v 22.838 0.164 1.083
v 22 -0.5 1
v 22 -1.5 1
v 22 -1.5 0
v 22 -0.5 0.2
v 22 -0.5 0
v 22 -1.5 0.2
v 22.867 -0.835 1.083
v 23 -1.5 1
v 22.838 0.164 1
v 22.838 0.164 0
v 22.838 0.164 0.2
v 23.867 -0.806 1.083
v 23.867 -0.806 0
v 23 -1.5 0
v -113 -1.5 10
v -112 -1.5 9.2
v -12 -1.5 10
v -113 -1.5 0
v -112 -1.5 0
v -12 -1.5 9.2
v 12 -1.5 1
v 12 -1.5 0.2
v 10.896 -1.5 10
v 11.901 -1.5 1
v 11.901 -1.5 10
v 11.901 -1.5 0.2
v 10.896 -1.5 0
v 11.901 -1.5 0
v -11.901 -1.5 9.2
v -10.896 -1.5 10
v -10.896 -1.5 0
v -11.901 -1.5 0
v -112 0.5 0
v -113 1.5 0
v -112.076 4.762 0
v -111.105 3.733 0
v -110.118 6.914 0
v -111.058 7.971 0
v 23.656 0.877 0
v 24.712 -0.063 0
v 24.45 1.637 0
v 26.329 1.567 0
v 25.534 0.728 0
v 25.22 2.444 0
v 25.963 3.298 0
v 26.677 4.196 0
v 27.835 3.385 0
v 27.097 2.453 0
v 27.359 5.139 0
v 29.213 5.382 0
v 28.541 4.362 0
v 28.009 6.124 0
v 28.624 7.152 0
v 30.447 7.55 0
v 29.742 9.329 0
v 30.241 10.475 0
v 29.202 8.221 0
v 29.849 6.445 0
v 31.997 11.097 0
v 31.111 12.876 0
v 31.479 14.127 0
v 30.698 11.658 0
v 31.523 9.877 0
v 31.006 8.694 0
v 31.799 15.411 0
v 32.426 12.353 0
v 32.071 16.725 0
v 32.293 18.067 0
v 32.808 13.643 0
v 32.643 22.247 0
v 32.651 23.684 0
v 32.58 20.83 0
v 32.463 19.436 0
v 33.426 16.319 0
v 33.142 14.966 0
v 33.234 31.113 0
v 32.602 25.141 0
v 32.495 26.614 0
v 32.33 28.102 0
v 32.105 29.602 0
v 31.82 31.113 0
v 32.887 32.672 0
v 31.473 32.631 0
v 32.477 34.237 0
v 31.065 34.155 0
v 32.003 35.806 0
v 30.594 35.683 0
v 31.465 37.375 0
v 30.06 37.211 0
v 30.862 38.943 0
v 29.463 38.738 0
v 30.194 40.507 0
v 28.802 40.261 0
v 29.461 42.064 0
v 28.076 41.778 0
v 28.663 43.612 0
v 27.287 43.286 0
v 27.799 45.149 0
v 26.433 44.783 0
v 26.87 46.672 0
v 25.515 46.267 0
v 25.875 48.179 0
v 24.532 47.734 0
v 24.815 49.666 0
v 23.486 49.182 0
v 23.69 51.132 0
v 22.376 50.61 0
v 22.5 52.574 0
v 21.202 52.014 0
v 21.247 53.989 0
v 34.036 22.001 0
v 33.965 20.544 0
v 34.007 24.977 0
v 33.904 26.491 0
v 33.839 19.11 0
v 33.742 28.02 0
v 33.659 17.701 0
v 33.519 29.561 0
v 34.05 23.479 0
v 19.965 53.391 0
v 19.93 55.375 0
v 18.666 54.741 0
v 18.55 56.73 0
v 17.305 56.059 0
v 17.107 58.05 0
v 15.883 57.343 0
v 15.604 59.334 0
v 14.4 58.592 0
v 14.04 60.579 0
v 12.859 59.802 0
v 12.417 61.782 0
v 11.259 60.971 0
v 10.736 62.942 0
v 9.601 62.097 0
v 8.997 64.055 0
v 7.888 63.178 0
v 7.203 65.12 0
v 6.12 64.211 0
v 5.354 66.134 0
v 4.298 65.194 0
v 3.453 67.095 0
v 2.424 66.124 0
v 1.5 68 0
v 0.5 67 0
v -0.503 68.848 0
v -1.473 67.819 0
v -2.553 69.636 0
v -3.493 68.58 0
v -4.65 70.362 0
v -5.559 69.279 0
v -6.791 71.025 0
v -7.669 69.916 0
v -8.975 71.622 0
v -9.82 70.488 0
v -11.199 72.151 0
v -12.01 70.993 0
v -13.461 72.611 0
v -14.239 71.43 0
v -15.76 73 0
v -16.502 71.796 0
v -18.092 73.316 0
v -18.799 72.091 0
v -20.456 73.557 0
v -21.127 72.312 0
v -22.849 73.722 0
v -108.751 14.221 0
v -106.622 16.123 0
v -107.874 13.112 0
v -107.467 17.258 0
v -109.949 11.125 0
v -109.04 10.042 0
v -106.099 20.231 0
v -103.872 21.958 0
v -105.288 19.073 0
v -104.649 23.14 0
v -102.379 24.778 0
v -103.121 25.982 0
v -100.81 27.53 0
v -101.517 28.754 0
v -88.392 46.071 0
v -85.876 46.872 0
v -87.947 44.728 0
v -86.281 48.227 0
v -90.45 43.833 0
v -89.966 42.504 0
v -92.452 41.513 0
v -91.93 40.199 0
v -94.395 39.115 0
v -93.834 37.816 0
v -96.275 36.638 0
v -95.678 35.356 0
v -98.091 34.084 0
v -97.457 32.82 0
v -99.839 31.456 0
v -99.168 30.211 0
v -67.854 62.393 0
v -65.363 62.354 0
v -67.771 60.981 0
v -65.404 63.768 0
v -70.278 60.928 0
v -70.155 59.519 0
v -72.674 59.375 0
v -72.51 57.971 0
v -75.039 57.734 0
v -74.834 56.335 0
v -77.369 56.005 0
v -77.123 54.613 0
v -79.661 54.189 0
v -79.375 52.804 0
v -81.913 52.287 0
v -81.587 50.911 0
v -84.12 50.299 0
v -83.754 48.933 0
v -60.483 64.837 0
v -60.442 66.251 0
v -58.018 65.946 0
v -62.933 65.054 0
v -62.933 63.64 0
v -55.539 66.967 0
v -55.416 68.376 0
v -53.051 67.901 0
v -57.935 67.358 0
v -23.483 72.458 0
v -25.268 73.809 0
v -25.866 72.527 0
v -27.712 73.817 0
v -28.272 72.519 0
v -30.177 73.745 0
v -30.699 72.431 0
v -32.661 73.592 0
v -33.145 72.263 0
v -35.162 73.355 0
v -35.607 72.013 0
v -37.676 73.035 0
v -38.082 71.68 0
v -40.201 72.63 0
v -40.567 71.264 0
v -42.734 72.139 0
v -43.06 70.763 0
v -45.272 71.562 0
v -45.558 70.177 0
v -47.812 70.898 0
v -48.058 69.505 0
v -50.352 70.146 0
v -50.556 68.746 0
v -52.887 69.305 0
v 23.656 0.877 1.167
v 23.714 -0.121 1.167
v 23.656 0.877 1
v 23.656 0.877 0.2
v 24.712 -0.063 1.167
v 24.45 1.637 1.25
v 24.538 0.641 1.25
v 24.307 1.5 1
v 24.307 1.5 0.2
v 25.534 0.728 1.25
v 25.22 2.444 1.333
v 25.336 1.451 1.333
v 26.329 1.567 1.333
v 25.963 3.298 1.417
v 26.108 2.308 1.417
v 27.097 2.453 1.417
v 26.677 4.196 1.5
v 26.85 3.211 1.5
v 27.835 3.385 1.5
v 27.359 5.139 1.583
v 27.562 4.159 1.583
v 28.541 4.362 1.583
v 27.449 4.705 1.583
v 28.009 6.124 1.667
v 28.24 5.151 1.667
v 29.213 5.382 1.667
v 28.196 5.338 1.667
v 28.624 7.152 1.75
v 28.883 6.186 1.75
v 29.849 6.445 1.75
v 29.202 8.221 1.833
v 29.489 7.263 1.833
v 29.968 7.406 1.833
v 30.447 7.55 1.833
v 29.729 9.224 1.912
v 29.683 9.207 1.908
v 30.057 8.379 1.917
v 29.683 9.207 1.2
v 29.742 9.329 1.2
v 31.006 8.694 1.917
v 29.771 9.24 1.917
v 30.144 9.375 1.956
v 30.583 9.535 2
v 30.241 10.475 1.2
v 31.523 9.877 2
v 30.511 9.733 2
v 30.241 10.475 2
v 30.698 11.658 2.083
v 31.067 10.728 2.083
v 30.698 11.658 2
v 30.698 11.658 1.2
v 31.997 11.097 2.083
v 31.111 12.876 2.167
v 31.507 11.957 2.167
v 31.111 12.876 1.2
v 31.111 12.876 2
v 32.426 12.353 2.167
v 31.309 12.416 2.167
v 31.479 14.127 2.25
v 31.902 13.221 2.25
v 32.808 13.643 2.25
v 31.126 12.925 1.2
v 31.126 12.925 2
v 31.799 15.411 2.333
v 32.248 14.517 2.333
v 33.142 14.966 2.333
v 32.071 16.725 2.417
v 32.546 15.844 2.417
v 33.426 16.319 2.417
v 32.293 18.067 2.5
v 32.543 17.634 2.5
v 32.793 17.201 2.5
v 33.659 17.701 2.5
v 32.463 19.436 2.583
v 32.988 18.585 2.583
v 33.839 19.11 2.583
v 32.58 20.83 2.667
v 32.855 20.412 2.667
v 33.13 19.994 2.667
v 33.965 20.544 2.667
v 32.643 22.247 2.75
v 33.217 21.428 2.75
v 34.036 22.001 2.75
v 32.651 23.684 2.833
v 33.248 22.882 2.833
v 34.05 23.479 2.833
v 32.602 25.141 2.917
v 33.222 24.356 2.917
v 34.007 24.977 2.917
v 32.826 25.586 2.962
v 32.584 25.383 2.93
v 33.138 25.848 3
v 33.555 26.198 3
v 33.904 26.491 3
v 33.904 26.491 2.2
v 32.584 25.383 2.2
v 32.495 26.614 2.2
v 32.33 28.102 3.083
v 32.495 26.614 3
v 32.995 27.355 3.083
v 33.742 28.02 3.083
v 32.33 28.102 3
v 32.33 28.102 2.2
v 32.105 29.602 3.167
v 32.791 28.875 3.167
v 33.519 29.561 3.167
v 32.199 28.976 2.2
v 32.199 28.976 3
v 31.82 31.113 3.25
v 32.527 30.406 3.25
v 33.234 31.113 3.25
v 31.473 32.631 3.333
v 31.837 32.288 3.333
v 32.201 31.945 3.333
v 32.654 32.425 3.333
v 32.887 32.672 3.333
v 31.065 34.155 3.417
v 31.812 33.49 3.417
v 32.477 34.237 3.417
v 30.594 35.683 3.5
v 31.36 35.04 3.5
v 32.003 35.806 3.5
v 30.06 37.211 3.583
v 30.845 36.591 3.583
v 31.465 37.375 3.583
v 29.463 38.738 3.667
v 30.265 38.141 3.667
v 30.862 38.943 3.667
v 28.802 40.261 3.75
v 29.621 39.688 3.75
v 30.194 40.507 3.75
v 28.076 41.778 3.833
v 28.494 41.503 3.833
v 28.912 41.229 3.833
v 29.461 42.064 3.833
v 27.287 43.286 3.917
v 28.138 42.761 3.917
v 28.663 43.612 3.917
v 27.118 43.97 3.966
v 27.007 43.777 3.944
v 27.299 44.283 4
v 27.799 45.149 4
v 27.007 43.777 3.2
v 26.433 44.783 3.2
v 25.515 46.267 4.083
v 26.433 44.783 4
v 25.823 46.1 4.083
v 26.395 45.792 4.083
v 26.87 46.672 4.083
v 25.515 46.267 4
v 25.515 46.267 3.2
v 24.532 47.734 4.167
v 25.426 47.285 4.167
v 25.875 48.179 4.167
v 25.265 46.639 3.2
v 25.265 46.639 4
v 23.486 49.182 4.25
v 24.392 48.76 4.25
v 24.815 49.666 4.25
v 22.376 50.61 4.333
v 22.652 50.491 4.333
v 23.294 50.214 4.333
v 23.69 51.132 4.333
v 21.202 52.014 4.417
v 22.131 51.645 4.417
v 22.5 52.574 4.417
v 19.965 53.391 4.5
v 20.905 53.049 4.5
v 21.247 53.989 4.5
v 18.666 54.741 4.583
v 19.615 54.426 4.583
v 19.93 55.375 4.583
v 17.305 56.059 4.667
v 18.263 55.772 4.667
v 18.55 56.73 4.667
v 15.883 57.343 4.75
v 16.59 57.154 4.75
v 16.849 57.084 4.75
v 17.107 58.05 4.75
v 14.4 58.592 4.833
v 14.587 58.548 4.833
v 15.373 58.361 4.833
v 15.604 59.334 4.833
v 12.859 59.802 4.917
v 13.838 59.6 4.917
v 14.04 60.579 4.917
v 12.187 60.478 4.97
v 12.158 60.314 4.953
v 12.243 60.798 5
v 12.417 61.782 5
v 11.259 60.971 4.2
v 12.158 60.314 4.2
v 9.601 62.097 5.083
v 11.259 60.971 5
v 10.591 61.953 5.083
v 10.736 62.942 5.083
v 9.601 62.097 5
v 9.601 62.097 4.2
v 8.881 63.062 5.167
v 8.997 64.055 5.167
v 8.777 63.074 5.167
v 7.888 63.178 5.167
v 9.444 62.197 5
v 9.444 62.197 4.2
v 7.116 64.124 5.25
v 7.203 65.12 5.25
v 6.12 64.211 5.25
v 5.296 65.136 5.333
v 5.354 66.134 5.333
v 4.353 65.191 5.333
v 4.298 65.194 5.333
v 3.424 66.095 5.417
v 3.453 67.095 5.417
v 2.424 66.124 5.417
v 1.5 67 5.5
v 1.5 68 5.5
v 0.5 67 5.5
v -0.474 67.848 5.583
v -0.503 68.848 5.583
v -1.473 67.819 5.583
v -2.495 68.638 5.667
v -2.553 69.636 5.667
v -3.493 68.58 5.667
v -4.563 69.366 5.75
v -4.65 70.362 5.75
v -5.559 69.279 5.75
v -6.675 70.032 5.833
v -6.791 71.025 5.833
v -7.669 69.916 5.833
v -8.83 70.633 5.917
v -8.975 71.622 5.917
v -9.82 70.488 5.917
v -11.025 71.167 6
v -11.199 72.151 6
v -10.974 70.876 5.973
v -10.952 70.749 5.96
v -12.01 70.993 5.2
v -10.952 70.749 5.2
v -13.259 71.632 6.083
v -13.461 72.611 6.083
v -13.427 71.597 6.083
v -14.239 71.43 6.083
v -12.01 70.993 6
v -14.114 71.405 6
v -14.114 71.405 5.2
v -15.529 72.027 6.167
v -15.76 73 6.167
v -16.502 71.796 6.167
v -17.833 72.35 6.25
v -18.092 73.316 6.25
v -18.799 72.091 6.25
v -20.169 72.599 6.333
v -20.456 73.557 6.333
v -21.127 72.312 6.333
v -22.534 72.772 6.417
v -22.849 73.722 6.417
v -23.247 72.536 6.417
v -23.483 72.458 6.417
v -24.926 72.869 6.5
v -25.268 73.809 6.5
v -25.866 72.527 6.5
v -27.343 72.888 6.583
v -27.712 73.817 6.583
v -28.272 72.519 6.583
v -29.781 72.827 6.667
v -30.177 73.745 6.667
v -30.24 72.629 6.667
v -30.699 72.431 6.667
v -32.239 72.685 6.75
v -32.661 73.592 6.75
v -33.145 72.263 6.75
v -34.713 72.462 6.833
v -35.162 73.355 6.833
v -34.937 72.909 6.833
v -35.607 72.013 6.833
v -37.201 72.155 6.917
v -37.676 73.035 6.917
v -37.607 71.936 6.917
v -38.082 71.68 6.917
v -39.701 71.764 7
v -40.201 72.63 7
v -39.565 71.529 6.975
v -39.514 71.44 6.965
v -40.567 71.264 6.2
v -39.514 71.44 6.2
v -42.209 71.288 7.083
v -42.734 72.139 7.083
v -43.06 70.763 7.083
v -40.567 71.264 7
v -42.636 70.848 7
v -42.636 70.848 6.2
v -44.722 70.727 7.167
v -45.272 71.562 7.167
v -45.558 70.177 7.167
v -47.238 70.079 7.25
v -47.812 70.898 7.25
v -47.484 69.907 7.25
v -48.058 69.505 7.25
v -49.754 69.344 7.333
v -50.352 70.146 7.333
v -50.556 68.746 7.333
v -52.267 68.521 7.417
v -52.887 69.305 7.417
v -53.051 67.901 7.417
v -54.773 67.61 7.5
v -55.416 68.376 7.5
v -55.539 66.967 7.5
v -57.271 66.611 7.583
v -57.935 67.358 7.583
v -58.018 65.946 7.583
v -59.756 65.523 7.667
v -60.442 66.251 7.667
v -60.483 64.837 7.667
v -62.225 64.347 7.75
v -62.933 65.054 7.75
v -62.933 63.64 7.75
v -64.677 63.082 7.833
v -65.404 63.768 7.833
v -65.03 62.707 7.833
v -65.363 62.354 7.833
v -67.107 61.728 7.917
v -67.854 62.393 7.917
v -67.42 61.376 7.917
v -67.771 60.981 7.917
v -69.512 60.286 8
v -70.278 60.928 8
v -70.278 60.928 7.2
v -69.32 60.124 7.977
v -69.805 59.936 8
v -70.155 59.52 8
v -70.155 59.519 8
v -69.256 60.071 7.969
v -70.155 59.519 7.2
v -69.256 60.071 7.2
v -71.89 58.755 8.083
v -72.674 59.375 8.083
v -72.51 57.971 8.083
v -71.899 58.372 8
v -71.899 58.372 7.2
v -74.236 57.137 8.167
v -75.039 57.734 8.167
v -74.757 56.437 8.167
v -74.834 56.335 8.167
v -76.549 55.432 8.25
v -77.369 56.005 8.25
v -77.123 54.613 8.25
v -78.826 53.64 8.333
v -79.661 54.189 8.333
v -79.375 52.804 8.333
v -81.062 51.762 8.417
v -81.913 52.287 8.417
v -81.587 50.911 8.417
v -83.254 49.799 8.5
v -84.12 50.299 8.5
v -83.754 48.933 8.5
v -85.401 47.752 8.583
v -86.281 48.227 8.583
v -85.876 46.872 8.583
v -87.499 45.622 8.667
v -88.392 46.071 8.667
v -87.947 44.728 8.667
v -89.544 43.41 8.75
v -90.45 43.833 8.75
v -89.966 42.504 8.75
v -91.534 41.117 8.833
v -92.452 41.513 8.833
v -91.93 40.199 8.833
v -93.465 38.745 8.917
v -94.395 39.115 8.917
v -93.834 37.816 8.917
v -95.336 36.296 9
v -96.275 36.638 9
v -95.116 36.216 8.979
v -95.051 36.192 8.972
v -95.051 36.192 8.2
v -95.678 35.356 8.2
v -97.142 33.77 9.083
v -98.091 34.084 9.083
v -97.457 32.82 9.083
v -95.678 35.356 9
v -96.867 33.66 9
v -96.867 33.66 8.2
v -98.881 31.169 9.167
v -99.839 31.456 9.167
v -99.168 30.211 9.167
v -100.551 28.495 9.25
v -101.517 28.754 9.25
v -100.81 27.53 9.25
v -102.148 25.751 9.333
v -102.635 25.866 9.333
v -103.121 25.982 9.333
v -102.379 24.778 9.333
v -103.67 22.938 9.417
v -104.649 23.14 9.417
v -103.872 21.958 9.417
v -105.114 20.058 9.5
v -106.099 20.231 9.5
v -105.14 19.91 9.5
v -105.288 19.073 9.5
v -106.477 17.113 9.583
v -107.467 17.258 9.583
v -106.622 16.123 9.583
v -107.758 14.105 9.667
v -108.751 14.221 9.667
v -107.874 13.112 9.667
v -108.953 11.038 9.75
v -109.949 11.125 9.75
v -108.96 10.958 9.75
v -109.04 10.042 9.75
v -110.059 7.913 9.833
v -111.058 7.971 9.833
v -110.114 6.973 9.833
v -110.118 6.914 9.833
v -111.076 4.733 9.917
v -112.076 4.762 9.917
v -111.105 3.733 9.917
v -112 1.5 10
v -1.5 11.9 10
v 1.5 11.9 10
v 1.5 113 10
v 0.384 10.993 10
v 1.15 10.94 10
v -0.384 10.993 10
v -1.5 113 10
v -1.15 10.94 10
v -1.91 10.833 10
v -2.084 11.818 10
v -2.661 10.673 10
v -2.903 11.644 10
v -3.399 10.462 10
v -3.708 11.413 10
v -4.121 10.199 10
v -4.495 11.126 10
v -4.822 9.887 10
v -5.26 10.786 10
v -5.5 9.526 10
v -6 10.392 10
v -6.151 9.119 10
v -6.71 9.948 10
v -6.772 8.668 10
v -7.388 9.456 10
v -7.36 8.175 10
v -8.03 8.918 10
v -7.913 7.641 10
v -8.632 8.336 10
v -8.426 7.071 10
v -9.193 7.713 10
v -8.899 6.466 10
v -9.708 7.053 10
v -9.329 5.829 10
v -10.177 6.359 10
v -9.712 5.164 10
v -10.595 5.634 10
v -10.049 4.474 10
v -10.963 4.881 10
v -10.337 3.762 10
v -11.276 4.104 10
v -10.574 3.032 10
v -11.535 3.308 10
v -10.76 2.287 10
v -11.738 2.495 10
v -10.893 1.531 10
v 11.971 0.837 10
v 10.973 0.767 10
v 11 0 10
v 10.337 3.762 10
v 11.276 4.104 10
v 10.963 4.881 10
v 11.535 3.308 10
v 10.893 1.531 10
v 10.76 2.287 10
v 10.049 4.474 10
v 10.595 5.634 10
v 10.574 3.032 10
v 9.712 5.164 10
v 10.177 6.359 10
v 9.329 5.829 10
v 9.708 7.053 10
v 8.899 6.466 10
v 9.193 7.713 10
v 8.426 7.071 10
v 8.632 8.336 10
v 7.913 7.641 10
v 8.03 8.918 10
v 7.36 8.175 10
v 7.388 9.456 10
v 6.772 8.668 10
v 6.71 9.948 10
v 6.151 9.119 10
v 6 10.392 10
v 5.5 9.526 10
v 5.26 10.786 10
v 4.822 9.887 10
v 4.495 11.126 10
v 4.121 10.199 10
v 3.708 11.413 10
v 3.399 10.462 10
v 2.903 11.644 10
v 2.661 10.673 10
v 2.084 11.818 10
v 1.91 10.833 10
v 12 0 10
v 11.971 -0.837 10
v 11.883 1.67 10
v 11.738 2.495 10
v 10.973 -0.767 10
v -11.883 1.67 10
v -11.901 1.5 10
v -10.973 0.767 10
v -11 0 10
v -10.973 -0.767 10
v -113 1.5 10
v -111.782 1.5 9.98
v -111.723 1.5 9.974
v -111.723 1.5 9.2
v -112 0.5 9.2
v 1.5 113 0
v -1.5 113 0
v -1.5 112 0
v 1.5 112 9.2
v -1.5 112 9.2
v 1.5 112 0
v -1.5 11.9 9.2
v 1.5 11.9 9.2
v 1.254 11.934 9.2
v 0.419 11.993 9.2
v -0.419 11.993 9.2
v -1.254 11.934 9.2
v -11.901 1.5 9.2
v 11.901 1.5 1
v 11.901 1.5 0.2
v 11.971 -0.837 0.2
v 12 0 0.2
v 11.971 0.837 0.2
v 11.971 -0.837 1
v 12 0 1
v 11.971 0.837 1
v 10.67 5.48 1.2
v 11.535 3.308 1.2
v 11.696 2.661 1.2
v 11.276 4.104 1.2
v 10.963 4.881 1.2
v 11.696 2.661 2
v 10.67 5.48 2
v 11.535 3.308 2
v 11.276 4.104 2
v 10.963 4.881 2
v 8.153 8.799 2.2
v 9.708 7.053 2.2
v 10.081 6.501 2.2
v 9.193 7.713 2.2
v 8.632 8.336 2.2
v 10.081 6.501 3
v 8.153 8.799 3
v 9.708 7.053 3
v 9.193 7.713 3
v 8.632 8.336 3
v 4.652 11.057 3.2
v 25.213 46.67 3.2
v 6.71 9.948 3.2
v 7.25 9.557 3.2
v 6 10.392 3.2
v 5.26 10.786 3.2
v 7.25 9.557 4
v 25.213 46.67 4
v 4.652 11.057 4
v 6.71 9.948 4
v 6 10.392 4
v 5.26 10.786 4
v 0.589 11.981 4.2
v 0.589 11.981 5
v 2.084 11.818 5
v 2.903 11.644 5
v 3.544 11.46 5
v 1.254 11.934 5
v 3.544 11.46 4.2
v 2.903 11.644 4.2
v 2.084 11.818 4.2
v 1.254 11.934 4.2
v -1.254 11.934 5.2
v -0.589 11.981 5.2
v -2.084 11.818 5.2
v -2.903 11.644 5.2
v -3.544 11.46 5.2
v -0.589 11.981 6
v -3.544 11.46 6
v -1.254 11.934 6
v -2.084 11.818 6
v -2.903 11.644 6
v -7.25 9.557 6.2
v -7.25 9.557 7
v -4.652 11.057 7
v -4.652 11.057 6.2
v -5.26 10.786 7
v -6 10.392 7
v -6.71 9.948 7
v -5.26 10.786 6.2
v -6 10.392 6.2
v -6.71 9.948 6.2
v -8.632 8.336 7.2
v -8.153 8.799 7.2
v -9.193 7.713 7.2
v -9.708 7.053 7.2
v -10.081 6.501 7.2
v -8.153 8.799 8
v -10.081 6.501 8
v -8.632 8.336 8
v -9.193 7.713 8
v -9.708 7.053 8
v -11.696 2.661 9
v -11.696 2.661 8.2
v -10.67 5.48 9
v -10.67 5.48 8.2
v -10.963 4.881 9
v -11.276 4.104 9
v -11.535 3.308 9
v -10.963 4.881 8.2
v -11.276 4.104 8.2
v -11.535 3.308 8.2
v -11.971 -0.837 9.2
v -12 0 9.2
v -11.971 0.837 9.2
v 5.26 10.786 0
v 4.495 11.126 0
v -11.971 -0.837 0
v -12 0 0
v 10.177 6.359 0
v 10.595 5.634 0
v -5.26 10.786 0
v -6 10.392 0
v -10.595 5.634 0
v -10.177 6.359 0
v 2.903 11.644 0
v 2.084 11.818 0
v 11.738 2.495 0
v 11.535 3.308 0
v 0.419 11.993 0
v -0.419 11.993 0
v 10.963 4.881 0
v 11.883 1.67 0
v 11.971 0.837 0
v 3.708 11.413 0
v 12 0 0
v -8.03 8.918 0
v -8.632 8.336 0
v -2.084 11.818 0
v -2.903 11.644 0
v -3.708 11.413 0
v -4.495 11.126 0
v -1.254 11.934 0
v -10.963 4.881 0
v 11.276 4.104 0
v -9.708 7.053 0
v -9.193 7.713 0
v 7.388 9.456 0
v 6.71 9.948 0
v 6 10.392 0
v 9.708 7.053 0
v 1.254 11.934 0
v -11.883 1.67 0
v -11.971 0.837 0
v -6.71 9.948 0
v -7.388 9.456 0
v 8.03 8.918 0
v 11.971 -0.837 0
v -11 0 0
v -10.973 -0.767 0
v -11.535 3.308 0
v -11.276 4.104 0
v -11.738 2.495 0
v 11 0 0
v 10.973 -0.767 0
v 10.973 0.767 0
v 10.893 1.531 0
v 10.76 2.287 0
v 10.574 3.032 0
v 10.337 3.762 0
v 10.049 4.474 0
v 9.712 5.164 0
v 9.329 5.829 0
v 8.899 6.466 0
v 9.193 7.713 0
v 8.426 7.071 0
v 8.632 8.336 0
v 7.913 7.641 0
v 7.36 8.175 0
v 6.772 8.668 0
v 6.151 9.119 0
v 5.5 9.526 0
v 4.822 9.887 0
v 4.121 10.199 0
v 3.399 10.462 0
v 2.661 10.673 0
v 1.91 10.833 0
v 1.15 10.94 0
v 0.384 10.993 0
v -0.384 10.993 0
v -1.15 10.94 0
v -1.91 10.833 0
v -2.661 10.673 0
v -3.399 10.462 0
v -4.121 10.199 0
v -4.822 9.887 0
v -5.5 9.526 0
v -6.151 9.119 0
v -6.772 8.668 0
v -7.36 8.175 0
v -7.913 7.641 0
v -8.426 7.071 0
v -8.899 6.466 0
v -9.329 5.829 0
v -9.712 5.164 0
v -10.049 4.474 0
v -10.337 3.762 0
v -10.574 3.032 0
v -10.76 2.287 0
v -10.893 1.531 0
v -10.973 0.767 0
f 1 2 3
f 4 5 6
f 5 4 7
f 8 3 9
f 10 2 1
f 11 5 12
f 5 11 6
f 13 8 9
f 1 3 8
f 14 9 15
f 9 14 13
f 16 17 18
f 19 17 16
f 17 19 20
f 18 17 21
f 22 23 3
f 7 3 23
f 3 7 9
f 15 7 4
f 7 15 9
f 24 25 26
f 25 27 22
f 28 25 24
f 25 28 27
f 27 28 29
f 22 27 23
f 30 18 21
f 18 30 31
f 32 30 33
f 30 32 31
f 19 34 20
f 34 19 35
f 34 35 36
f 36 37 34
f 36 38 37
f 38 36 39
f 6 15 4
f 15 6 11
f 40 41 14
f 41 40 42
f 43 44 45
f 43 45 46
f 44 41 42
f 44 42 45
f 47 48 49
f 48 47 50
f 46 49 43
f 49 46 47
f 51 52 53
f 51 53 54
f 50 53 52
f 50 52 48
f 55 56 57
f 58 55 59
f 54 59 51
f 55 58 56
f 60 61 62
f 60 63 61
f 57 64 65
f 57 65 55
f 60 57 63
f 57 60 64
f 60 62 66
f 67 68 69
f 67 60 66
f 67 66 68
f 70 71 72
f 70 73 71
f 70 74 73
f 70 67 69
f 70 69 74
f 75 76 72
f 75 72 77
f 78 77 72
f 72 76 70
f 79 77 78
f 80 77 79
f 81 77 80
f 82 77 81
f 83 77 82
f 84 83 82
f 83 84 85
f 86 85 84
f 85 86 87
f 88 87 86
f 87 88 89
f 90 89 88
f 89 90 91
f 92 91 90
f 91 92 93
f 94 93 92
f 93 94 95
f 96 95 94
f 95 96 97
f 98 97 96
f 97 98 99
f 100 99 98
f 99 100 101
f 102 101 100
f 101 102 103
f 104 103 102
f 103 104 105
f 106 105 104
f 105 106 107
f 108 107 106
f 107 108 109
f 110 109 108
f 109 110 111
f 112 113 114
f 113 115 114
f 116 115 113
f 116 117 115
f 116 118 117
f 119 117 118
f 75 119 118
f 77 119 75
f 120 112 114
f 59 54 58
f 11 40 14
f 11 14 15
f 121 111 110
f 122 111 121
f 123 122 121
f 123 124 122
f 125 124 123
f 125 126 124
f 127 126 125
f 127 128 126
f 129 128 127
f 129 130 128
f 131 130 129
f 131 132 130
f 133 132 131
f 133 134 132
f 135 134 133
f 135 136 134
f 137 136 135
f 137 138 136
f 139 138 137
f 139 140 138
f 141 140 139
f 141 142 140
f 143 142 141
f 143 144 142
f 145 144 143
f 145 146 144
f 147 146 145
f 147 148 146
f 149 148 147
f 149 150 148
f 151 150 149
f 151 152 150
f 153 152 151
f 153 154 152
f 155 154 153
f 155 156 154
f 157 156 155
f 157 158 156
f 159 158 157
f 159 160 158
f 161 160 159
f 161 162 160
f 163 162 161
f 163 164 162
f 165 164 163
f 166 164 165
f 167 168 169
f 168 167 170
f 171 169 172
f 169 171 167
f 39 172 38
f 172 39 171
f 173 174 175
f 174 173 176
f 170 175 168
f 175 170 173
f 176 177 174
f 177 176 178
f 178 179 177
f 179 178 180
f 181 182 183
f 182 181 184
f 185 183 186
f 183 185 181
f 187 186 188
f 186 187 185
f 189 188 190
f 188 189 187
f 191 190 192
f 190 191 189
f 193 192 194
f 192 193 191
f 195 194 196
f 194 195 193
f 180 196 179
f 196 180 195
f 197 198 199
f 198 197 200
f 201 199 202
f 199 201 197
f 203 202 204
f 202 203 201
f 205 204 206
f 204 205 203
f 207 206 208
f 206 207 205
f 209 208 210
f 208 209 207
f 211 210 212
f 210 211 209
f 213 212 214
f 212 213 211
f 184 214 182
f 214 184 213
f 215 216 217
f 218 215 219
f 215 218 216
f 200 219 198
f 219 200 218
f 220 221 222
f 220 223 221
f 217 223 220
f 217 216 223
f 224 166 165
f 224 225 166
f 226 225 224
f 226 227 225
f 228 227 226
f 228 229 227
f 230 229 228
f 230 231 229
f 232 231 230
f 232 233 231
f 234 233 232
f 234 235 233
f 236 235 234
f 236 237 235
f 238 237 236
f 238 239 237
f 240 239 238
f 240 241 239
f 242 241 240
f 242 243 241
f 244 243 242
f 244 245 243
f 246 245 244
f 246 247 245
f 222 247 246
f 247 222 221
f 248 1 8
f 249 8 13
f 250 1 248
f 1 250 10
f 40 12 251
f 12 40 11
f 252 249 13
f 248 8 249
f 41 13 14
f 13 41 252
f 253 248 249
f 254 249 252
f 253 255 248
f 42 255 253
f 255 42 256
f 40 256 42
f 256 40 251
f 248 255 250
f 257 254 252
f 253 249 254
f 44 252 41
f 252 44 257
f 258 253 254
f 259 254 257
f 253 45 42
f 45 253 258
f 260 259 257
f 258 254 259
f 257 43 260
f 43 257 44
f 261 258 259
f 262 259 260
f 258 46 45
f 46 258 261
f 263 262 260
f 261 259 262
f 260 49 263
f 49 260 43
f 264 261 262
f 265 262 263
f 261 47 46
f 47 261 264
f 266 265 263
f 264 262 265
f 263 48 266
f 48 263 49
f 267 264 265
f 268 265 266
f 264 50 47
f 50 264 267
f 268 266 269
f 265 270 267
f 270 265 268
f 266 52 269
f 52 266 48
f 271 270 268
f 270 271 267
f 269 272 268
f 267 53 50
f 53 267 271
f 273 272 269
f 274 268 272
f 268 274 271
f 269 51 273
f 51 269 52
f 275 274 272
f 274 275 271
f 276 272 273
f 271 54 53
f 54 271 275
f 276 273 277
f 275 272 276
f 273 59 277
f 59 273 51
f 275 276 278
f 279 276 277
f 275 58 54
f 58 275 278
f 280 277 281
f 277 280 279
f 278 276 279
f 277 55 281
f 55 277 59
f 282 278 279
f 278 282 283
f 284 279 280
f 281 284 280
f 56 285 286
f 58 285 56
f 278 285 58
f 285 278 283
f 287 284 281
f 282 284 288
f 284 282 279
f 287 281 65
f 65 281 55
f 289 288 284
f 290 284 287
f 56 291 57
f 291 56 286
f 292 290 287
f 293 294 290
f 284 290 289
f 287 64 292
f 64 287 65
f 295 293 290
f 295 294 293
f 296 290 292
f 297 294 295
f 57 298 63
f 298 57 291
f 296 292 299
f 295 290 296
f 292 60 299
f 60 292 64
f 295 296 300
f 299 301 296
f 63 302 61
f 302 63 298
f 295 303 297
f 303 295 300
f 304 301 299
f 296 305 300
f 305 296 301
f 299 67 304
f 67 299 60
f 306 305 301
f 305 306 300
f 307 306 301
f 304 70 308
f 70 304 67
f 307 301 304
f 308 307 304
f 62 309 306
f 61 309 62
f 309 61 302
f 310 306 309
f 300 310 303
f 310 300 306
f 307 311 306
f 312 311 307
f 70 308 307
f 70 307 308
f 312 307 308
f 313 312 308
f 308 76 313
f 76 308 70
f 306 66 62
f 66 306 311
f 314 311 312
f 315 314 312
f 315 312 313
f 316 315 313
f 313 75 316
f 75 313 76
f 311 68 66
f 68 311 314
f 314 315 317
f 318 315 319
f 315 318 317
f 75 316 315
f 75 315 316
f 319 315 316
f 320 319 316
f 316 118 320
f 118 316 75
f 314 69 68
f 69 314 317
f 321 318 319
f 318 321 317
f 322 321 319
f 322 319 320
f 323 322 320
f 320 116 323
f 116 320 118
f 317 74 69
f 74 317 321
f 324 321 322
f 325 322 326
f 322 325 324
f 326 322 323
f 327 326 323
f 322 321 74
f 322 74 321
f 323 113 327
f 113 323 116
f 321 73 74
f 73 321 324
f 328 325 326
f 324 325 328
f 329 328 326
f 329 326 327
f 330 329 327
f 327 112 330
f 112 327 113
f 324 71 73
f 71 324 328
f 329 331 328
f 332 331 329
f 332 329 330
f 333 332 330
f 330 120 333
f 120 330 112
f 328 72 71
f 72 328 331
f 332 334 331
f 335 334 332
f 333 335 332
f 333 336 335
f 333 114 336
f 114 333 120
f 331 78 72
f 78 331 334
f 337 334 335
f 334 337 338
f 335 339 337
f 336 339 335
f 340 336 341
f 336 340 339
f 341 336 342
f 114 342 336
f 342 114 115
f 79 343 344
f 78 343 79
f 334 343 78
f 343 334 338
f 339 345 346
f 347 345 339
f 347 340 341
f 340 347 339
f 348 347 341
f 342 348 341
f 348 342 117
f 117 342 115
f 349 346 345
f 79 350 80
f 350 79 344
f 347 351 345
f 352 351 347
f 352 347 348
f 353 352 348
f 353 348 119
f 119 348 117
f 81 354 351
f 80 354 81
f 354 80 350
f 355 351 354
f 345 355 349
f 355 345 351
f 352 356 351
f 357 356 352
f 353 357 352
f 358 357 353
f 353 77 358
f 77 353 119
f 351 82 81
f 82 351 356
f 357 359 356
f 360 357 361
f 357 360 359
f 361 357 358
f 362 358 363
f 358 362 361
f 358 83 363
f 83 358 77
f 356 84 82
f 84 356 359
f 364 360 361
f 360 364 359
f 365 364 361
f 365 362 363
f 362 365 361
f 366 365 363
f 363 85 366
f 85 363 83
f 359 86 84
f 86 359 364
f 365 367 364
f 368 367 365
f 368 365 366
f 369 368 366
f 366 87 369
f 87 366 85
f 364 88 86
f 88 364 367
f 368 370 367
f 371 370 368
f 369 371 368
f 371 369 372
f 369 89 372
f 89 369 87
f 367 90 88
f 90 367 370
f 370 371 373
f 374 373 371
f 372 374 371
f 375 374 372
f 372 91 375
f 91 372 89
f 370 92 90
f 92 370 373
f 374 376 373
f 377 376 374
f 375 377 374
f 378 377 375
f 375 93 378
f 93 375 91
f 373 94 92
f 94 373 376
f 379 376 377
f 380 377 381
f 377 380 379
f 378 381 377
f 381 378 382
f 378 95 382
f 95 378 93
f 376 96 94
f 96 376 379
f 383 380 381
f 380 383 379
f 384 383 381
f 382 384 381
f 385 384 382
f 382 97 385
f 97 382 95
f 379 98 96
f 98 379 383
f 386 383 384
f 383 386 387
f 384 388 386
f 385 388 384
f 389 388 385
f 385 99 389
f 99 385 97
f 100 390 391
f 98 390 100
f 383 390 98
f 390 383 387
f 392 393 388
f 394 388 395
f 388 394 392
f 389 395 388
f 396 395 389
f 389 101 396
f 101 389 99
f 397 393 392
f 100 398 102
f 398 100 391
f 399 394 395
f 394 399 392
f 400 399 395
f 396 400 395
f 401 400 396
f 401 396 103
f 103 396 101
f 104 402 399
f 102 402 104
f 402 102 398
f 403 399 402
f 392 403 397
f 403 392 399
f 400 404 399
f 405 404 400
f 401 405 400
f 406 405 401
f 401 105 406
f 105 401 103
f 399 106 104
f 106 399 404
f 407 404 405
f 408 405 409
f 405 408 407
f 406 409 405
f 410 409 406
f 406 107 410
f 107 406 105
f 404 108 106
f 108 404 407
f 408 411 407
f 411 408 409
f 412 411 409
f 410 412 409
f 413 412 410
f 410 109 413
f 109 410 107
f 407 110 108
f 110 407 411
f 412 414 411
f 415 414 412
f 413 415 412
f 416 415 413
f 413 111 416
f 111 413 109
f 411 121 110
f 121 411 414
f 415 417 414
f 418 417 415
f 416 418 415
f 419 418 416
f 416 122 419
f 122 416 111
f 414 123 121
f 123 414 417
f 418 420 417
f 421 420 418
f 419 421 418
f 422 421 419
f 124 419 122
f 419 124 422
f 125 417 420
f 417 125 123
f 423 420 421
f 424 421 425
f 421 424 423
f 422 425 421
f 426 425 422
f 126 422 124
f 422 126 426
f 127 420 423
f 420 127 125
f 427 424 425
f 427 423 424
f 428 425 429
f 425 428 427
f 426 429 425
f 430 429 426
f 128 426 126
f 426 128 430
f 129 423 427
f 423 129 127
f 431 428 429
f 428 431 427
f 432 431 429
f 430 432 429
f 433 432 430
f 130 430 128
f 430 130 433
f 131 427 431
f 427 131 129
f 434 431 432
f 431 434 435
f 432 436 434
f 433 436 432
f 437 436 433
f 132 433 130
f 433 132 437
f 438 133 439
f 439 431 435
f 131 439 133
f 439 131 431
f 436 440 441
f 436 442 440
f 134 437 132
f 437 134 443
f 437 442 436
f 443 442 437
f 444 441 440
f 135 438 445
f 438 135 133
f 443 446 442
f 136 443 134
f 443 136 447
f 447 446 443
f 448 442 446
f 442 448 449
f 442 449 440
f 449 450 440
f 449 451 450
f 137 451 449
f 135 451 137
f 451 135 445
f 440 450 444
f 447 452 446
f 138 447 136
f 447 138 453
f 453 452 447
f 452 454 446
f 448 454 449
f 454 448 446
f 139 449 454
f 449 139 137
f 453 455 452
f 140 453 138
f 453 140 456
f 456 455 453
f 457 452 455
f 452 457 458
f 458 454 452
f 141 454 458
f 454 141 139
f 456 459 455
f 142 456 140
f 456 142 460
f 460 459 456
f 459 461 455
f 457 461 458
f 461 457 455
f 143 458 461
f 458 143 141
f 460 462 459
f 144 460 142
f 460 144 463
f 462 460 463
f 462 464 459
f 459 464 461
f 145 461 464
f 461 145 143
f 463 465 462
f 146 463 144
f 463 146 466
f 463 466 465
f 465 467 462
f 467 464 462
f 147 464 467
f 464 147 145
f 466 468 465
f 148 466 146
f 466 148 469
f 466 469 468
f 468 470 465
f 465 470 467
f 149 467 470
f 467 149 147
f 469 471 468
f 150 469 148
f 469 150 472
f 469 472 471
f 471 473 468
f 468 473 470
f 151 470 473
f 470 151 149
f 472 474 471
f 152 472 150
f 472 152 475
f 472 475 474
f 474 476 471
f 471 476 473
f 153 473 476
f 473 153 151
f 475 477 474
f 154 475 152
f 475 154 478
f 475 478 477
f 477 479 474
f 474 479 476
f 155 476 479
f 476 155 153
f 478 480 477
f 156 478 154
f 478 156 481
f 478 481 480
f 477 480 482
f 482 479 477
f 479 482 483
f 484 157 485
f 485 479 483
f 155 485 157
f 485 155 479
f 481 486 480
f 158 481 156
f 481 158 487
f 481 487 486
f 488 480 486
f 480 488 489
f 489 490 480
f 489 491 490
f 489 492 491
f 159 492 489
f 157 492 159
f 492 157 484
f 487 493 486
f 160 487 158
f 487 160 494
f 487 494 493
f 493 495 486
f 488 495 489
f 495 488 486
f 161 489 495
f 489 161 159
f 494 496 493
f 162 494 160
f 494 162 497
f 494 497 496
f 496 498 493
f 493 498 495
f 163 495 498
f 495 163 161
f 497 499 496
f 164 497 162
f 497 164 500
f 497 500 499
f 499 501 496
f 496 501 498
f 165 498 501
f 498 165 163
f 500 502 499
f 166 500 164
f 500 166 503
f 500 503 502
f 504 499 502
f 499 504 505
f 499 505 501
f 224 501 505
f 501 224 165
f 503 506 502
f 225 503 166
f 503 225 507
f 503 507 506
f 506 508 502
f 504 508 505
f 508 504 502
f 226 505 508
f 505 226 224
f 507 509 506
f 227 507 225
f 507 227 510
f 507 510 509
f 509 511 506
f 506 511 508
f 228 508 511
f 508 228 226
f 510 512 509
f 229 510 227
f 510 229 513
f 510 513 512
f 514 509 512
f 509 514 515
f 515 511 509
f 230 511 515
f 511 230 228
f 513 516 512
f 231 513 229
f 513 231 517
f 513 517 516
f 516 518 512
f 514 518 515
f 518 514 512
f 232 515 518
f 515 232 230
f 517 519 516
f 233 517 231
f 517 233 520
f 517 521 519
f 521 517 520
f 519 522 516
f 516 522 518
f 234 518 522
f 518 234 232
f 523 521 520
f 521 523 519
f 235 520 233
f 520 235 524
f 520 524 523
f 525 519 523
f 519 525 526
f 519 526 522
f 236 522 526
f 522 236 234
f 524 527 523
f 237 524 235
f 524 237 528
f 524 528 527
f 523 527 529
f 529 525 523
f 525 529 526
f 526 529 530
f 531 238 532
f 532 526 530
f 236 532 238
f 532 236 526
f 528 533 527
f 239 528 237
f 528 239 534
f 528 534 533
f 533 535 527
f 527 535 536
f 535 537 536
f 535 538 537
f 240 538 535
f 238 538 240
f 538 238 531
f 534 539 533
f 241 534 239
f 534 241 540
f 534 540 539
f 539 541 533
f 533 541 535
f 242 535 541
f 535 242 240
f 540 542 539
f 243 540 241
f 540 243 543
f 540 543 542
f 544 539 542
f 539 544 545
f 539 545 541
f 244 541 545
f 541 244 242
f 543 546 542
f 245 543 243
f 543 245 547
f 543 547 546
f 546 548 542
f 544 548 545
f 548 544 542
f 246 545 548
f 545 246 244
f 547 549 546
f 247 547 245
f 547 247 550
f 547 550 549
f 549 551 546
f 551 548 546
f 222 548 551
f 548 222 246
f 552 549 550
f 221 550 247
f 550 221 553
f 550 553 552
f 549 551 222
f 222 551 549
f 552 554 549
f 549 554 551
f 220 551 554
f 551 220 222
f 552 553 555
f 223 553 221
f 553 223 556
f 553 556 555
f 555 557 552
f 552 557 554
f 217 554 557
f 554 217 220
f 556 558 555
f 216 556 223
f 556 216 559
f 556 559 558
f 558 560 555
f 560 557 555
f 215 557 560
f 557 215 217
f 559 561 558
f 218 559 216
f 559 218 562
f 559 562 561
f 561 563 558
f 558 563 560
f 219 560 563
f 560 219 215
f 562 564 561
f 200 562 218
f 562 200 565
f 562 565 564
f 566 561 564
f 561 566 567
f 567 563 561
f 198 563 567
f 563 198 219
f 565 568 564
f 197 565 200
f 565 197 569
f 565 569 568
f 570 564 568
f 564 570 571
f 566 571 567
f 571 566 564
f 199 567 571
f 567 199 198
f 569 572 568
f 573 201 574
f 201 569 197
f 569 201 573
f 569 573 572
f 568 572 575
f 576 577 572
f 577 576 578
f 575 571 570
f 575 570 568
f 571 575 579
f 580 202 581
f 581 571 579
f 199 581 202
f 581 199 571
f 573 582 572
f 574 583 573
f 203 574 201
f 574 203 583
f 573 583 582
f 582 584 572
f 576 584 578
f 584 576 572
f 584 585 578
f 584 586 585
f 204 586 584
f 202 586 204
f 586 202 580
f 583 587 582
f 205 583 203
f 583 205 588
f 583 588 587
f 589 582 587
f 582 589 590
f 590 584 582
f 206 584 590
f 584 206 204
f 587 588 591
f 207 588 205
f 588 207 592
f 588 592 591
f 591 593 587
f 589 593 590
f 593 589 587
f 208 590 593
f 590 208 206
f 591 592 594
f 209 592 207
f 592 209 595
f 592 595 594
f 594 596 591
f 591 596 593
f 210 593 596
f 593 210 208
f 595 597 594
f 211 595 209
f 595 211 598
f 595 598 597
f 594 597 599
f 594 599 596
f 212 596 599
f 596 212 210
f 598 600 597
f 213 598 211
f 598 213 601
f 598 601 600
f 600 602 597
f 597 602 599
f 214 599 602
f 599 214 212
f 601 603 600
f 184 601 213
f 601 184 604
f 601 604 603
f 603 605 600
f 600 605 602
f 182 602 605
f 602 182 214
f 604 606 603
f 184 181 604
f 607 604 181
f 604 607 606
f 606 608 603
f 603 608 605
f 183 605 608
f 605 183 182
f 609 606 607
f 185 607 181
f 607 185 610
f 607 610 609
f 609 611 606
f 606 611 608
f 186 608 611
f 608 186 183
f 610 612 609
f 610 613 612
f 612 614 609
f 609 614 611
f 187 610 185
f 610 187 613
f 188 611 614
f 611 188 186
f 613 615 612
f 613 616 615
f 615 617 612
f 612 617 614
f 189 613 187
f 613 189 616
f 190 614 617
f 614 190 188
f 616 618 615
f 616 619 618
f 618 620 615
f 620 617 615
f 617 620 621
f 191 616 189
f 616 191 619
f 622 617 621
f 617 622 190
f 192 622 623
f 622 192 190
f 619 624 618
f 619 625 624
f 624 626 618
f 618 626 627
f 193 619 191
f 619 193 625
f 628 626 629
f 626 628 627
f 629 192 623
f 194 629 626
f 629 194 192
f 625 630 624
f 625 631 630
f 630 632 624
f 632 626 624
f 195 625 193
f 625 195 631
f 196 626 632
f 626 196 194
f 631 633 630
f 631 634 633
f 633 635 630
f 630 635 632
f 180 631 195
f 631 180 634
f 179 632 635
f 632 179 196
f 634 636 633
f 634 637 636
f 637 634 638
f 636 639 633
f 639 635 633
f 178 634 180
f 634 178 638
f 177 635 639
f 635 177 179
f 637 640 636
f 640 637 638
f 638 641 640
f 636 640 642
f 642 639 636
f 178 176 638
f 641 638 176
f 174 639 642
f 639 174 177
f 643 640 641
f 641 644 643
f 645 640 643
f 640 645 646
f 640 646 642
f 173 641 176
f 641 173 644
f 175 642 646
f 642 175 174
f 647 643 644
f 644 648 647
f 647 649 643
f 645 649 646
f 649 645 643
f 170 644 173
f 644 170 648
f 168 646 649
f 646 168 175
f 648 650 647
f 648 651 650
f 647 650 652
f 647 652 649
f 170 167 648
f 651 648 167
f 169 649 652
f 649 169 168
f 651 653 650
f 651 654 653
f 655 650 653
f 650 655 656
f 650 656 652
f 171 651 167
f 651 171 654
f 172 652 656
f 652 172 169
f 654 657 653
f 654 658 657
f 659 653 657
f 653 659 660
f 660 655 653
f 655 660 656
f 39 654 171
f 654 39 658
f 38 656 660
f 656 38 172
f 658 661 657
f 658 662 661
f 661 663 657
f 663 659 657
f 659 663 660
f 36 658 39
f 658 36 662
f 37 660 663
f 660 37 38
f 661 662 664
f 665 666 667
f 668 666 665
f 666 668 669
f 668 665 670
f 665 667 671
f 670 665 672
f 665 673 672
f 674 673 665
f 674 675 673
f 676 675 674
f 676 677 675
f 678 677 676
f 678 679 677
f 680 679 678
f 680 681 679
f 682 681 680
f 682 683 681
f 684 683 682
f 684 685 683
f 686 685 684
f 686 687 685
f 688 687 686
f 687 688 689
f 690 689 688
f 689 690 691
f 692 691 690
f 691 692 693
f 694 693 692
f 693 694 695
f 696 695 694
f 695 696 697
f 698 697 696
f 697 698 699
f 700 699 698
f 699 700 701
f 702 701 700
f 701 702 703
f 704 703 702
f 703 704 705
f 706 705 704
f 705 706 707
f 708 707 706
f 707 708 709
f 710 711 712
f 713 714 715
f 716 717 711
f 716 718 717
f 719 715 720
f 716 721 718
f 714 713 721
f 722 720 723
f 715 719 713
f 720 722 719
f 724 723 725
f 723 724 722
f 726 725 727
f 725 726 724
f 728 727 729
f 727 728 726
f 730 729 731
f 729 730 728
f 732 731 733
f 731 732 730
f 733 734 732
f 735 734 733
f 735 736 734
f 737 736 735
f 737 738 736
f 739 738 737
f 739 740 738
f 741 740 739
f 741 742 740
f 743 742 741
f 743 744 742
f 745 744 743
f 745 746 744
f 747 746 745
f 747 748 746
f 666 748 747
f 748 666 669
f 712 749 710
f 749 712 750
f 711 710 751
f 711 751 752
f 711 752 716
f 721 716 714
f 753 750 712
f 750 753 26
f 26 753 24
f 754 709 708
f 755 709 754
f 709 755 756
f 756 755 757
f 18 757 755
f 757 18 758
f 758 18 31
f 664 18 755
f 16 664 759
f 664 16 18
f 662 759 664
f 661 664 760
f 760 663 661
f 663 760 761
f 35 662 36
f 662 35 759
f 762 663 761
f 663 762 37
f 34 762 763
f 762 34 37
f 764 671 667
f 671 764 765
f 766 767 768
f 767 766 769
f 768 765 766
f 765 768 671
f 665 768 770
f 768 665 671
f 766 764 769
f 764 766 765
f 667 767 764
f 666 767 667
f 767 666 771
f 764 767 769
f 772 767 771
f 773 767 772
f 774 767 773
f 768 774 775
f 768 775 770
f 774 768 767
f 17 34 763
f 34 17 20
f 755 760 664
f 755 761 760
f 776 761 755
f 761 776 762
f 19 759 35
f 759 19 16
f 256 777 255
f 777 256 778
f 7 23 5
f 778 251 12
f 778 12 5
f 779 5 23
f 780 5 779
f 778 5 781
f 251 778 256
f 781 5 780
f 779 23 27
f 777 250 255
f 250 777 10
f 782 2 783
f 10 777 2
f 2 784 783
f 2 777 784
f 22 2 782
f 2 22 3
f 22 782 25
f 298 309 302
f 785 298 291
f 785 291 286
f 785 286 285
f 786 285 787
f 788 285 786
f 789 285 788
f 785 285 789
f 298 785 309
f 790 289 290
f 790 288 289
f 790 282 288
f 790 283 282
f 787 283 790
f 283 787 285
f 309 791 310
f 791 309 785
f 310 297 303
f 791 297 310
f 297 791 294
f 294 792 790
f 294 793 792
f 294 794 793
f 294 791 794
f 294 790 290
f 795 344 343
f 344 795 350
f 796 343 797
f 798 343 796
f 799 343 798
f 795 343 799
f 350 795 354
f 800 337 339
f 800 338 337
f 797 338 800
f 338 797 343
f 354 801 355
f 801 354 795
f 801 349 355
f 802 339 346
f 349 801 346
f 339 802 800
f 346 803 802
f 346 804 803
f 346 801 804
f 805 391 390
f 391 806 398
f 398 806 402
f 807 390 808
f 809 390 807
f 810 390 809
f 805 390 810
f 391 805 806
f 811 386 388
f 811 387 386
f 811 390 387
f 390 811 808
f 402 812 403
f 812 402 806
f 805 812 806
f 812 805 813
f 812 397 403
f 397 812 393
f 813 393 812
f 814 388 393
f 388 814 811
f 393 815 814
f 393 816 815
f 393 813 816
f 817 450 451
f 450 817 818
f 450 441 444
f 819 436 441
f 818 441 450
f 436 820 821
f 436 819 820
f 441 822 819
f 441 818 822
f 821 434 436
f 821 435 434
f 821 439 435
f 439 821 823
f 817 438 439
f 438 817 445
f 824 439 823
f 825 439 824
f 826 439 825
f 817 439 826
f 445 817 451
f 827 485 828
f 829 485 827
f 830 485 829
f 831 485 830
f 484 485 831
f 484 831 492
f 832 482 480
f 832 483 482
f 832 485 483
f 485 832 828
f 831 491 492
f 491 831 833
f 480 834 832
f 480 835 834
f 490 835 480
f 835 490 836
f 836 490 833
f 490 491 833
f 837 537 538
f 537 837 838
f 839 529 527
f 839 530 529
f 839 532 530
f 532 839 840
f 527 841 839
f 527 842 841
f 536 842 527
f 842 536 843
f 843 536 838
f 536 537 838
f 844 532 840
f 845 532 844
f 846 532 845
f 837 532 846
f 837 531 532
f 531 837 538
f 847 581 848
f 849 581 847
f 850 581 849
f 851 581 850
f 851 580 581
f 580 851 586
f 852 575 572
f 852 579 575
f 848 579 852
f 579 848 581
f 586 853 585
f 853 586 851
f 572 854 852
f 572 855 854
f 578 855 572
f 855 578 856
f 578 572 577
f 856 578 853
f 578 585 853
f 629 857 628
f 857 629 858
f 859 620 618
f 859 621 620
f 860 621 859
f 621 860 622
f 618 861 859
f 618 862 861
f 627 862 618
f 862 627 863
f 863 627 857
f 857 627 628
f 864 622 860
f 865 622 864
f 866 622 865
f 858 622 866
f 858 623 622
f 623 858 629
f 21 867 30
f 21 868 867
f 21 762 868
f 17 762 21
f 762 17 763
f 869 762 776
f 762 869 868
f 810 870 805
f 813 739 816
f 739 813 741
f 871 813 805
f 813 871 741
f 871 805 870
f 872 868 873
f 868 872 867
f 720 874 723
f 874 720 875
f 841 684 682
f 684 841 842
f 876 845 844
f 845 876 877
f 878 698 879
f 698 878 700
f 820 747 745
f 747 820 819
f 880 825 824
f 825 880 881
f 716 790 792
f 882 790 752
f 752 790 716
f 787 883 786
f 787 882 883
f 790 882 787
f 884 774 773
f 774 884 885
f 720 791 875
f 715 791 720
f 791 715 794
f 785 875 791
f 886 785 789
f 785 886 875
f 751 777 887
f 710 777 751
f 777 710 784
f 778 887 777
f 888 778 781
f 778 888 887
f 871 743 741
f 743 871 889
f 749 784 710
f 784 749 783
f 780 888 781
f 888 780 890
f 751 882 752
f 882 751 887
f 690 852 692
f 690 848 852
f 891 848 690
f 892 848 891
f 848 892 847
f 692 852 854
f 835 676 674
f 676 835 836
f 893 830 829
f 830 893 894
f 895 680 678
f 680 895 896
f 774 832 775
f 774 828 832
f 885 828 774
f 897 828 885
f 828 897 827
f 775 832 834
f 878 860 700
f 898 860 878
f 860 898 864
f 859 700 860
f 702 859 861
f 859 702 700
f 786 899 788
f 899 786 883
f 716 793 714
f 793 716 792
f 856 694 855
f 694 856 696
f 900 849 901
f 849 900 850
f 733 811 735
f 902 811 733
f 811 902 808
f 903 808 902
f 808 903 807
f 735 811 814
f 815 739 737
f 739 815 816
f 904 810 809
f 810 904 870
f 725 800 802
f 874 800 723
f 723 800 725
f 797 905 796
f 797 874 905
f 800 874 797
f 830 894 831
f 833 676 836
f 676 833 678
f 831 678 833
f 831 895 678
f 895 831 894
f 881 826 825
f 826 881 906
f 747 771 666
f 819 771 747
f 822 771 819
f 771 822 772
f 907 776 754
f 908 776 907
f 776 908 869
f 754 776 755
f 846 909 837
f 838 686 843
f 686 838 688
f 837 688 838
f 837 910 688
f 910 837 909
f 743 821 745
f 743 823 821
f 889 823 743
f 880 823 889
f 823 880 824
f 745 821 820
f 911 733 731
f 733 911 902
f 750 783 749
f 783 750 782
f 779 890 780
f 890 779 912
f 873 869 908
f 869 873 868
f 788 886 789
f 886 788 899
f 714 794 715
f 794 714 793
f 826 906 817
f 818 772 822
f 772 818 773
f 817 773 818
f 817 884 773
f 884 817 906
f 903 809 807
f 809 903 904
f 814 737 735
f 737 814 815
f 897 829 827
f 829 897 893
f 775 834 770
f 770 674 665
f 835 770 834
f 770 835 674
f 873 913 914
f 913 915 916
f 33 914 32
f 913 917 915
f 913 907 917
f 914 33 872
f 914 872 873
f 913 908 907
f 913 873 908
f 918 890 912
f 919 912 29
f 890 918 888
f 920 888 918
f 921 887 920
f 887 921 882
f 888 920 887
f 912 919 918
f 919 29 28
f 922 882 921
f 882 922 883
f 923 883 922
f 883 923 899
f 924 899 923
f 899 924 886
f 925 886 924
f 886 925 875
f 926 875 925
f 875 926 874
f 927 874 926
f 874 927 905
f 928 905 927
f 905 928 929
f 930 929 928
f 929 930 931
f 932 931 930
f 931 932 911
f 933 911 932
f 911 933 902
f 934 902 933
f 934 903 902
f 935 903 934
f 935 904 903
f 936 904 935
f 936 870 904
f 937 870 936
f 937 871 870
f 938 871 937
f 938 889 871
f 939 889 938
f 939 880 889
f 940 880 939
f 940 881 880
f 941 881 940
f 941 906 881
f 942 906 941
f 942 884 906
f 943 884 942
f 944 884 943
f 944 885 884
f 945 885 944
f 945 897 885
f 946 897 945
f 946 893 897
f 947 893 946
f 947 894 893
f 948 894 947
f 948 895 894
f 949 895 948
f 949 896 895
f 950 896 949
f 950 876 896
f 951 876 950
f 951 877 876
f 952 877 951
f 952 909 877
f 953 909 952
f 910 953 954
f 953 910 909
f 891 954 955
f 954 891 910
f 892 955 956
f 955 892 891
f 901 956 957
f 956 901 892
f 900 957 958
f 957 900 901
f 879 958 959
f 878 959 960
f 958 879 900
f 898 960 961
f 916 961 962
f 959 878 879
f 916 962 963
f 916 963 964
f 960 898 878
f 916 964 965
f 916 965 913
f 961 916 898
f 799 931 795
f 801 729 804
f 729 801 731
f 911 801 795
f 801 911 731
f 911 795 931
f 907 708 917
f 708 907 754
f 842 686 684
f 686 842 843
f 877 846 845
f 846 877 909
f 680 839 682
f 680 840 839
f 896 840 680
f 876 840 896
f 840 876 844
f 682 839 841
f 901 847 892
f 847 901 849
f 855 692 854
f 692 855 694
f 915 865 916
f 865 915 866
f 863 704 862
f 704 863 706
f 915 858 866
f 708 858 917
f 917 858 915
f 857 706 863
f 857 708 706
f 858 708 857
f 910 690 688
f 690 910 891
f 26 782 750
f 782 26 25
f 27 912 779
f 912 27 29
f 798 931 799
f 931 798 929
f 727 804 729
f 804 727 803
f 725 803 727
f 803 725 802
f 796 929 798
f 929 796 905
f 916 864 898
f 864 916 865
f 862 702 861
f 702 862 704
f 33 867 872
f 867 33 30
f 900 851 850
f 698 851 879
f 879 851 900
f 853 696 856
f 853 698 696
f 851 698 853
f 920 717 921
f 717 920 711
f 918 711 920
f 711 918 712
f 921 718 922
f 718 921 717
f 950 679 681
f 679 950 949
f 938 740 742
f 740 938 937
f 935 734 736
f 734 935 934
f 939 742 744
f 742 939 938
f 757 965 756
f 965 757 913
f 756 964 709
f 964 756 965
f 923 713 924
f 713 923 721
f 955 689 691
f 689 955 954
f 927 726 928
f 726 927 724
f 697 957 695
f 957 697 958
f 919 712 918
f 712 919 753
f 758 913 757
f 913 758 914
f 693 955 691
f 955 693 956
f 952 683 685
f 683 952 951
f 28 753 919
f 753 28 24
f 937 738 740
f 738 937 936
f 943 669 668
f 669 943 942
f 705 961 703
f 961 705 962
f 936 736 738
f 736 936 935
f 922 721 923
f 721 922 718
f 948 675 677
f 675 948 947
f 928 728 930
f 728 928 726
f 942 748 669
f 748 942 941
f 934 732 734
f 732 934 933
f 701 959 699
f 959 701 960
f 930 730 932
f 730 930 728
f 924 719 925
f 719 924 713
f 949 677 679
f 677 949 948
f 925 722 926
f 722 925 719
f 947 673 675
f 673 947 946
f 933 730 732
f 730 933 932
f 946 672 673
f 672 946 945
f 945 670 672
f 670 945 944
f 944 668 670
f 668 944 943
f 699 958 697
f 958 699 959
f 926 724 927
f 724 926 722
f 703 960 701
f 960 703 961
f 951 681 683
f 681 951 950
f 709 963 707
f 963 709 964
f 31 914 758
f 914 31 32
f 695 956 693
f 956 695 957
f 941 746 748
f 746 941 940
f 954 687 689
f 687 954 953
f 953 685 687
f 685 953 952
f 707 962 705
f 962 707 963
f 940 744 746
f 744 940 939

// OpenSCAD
// OpenSCAD  test object for bridges
// Also tests for on-extruder fan cooling unevenness in X,Y axes.

// Parametrised to use as much space on a print bed as required.
// this design uses only half the spiral of the original.

// Customiser enabled

// preview[view:north east, tilt:top diagonal]

/*[Bridges]*/
// length of the shortest bridge
min_bridge_length = 10; //[10:5:180]

// length of the longest bridge
max_bridge_length = 100; //[20:5:200]

// Total number
number_of_bridges = 10; //[4:1:20]

// difference between subsequent bridges
bridge_increment = (max_bridge_length - min_bridge_length) / (number_of_bridges - 1) ; //5;

// Test the XY cooling efficiency
show_XY_test = "yes"; // [yes,no]

/*[Shape]*/
// diameter of the central hub
hub_diameter = 24; //[18:1:30]

// width of each bridge
bridge_width = 3; //[1:1:8]

// thickness of the vertical walls
wall_thickness = 1; //[1:10]

// layer height of each bridge
bridge_height = 0.8; //[0.1:0.1:2]

// height of each bridge above the previous bridge
bridge_z_gap = 0.2; //[0.2:0.1:1]

/* [Hidden] */
// angle between each bridge
bridge_angle = 180.0 / (number_of_bridges -1);

spiralResolution = 12*1;
spiralIncrement = 1/spiralResolution;
maxAngle = bridge_angle * (number_of_bridges-1);
eps = 0.1 * 1; 
$fn = 90 * 1;


function spiralOffset(angle) = min_bridge_length + angle/maxAngle * (max_bridge_length - min_bridge_length);
function extensionAngle(length) = asin((bridge_width*0.5)/length);

module bridgeTest() {
	tubeHeight = number_of_bridges * (bridge_height + bridge_z_gap);
	heightStride = bridge_height + bridge_z_gap;

	difference() {
		union() {
			// Central hub
			cylinder(r = hub_diameter/2, h = tubeHeight);
			
			// The spokes (bridges)
			for (i=[0:number_of_bridges-1]) {
				length = spiralOffset(i*bridge_angle) + wall_thickness * 2;
				start_height = i * heightStride  + bridge_z_gap;
				hull() {
					rotate([0, 0, i*bridge_angle]) {
						translate([hub_diameter/2 - wall_thickness, 0, start_height]) {
							translate([0, -bridge_width/2, 0])
							cube([length , bridge_width, bridge_height], center=false);
							if (i < number_of_bridges-1) {
								translate([0, bridge_width/2 - eps, 0]) {
									cube([spiralOffset(i*bridge_angle + extensionAngle(length)) + wall_thickness, eps, bridge_height], center=false); // only an approximation
								}
							}
						}
					}
				}
				// Outer Spiral uprights
				if (i < number_of_bridges-1) {
					for (f=[0 : spiralResolution-1]) {
						frac  = f / spiralResolution;
						top	  = start_height + bridge_height;
						//end	= i == number_of_bridges-1 && f == spiralResolution-1;
						angle = i*bridge_angle + bridge_angle * f / spiralResolution;
						hull()  { // This hull sweeps through all the supports making a nice spiral
							rotate([0, 0, angle]) {
								translate([hub_diameter/2 + spiralOffset(angle), -bridge_width/2, 0]) {
									cube([wall_thickness, wall_thickness, top + heightStride * frac], center=false);
								}
								rotate([0, 0, bridge_angle * spiralIncrement])
								translate([hub_diameter/2 + spiralOffset(angle + bridge_angle * spiralIncrement),
										   -bridge_width/2, 0]) {
									cube([wall_thickness, wall_thickness, top + heightStride * (frac + spiralIncrement)], center=false); 
								}
							}
						}
					}
				} else { // last upright of outer spiral
					rotate([0, 0, i*bridge_angle]) {
						translate([length + hub_diameter/2 - wall_thickness*2, -bridge_width/2, 0]) {
							cube([wall_thickness, bridge_width, start_height + heightStride-bridge_z_gap], center=false);
						}
					}
					if (show_XY_test == "yes") {
						// extra leg
						rotate([0, 0, i*bridge_angle -90]) {
							translate([length + hub_diameter/2 - wall_thickness*2, -bridge_width/2, 0]) {
								cube([wall_thickness, bridge_width, start_height + heightStride-bridge_z_gap], center=false);
							}
						}
						// extra bridge
						rotate([0, 0, i*bridge_angle - 90]) {
							translate([hub_diameter/2 - wall_thickness, 0, start_height]) {
								translate([0, -bridge_width/2, 0])
								cube([length , bridge_width, bridge_height], center=false);
							}
						}
					}
				}
			}
		}
		// core out the cylinder and remove the un-needed side
		cylinder(r=hub_diameter/2 - wall_thickness, h=tubeHeight*3, center=true);
		translate([-hub_diameter/2, -hub_diameter-bridge_width/2, -1]) {
			cube([hub_diameter, hub_diameter, tubeHeight+2], center=false);
		}
	}

}

bridgeTest();
